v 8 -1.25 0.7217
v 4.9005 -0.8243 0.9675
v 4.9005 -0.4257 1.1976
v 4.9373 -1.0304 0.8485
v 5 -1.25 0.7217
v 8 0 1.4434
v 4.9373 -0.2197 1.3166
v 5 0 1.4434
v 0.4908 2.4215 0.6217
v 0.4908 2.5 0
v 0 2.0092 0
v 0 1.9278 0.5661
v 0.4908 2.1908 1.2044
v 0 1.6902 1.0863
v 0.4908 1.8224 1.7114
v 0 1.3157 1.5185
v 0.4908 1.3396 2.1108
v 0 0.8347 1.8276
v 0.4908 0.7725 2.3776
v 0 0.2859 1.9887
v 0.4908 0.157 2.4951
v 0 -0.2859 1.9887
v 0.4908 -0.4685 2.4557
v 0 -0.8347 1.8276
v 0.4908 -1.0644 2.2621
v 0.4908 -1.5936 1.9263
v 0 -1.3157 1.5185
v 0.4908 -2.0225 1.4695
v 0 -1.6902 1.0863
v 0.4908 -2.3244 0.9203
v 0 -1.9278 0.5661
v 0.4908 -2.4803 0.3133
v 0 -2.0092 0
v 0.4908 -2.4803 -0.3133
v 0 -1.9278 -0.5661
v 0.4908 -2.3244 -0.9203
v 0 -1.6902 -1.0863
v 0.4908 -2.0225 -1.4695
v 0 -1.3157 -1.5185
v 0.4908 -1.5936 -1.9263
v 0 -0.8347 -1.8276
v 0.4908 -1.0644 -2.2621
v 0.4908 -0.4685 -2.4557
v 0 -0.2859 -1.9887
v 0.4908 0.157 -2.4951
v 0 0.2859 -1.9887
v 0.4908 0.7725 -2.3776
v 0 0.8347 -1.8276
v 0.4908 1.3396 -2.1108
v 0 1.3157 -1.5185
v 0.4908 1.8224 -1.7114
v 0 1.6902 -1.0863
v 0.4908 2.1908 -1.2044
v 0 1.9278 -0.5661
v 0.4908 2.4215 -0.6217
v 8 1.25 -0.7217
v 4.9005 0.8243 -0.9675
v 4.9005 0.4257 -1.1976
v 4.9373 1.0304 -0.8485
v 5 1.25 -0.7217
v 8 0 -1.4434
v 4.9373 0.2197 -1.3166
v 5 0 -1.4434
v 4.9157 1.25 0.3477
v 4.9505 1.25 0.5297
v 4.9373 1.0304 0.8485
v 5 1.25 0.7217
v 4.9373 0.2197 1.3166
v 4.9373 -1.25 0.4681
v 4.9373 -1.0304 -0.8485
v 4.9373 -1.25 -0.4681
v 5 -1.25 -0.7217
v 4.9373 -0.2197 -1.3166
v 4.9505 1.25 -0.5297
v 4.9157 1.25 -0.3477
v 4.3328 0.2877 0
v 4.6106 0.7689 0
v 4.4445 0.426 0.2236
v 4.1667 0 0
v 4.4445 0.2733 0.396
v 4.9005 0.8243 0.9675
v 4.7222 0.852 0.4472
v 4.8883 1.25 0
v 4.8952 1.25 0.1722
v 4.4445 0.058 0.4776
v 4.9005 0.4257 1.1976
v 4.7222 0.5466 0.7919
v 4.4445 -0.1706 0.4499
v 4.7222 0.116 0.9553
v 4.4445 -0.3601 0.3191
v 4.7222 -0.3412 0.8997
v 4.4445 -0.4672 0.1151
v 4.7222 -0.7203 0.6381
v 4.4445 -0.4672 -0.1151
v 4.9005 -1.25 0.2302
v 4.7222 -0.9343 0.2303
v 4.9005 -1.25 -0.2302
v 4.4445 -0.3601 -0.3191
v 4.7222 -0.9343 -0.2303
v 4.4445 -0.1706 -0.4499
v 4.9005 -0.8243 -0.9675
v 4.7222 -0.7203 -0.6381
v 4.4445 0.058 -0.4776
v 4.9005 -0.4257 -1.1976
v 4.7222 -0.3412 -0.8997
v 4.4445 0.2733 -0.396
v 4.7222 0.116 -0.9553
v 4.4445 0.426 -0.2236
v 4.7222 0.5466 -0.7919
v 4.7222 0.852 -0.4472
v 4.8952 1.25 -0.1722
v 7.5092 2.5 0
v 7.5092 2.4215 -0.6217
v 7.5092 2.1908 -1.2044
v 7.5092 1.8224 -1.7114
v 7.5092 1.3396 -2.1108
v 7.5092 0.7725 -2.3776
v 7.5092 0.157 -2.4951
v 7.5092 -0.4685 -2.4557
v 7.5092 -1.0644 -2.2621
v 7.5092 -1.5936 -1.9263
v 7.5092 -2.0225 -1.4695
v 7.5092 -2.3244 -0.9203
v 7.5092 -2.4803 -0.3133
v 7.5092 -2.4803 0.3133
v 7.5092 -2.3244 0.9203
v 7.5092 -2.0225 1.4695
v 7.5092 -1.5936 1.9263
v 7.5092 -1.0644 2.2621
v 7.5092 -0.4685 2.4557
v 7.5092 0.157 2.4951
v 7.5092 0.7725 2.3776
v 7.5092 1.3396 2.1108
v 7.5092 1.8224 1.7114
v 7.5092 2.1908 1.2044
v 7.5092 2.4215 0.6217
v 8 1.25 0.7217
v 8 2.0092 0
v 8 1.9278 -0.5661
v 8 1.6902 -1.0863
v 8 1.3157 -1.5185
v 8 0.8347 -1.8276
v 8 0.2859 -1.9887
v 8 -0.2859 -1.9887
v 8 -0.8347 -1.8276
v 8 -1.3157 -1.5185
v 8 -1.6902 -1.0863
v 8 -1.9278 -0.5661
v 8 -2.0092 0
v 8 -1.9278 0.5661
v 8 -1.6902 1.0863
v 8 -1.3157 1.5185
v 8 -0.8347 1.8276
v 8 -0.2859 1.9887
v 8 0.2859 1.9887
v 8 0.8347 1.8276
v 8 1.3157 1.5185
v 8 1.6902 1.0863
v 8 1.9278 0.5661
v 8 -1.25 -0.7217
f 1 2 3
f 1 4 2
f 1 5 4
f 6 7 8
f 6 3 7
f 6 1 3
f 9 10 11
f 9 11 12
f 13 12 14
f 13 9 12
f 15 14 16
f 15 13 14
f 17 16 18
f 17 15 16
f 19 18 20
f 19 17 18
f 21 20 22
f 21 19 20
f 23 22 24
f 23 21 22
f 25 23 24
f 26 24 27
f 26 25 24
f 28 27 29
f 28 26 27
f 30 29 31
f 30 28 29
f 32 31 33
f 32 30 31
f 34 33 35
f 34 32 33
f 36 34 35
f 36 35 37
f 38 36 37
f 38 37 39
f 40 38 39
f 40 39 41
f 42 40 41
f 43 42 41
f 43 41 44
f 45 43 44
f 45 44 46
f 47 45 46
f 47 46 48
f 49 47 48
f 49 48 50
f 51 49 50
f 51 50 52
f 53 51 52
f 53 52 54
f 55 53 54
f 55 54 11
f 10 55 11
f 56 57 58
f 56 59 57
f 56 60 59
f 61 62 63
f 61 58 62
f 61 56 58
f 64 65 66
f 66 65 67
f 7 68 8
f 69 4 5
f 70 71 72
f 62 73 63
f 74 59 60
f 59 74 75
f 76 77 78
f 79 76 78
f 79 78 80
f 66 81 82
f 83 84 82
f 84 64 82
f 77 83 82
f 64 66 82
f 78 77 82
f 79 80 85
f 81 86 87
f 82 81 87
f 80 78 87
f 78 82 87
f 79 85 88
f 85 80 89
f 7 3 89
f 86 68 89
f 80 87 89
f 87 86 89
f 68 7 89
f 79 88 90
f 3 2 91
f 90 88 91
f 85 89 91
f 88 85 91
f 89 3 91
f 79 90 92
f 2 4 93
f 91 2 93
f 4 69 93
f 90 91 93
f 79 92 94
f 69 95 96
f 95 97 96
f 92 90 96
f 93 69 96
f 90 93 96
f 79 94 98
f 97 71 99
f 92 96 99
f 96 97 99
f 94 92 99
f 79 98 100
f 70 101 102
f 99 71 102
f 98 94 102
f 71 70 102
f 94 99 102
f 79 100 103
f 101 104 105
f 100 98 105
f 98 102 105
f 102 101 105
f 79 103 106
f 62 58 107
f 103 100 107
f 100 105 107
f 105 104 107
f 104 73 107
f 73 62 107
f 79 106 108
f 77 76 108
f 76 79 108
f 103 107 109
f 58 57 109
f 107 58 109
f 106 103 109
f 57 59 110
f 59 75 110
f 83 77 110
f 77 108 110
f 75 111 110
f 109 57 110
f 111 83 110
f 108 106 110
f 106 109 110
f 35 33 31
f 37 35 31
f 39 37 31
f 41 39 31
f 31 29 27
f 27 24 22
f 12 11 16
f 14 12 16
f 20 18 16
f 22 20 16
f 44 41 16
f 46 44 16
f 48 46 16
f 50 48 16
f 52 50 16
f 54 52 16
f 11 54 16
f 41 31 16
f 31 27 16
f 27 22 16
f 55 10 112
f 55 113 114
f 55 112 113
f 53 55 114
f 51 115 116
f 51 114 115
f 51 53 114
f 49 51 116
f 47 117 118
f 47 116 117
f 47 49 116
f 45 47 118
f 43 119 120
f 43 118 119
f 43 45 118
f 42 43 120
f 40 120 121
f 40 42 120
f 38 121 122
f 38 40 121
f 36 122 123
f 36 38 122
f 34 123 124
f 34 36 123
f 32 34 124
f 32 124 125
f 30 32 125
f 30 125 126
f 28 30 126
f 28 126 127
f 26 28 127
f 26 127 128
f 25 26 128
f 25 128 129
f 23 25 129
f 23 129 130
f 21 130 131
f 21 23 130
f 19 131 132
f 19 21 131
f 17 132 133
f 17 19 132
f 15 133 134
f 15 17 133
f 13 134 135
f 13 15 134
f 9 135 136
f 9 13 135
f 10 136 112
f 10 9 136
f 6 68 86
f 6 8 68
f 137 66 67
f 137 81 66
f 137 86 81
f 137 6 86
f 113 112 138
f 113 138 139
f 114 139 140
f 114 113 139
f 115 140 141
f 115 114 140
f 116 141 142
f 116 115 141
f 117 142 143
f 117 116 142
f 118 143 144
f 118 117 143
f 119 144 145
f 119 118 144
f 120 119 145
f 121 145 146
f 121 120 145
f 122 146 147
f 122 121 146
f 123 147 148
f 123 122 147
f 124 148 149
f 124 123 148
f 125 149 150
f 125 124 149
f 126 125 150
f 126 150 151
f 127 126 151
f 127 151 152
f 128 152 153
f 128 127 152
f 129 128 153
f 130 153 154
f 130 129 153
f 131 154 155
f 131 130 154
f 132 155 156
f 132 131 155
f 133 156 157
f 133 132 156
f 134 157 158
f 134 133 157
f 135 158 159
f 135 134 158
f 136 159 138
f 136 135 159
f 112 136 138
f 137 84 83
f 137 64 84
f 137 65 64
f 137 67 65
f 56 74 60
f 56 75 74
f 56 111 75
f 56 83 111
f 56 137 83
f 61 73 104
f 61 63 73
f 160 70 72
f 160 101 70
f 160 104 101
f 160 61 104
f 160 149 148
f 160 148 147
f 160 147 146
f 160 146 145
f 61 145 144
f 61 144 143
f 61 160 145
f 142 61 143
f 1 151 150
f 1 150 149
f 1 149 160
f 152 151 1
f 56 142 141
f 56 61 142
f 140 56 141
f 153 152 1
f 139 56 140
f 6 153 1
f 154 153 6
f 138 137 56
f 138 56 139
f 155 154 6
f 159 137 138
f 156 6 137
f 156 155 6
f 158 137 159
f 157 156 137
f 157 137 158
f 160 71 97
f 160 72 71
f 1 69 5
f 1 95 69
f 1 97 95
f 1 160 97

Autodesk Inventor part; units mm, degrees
ref_plane "YZ Plane" through (0, 0, 0) normal (1, 0, 0) x (0, 1, 0)
ref_plane "XZ Plane" through (0, 0, 0) normal (0, 1, 0) x (-1, 0, 0)
sketch "Skizze1" plane through (0, 0, 0) normal (0, 0, 1) x (1, 0, 0)
  line L0 (0, 0) -> (4.1667, 0)
  line L1 (8, 1.4434) -> (8, 2.5)
  line L2 (8, 2.5) -> (0, 2.5)
  line L3 (8, 1.4434) -> (5, 1.4434)
  line L4 (5, 1.4434) -> (4.1667, 0)
  line L5 (0, -0.5) -> (0, 3) projected
  line L6 (0, 2.5) -> (0, 0)
  dimension "d0" = 3
  dimension "d1" = 60
  dimension "d2" = 5
  dimension "d3" = 2.8868
  dimension "d5" = 8
revolve "Körper" add sketch "Skizze1" angle 360 about axis through (0, 0, 0) along (1, 0, 0)
chamfer "Fase1" distance 0.4908 angle 45 1 edges at (8, -2.5, 0) measured on face at (8, 2.1096, -0.3146)
sketch "Skizze2" plane through (8, 0, 0) normal (1, 0, 0) x (0, 0, -1)
  circle A0 centre (0, 0) radius 1.4434 projected
  line L0 (-0.7217, 1.25) -> (0.7217, 1.25)
  line L1 (0.7217, 1.25) -> (1.4434, 0)
  line L2 (1.4434, 0) -> (0.7217, -1.25)
  line L3 (0.7217, -1.25) -> (-0.7217, -1.25)
  line L4 (-0.7217, -1.25) -> (-1.4434, 0)
  line L5 (-1.4434, 0) -> (-0.7217, 1.25)
extrude "Loch" add sketch "Skizze2" against normal up to next contours L1 A0 | A0 L2 | L0 A0 | A0 L3 | L5 A0 | A0 L4
thread "Gewinde" size "M5x0.8" class "6g" standard "ISO Metric profile" length 8
chamfer "Fase2" distance 0.4908 angle 45 1 edges at (0, -2.5, 0) measured on face at (2.5031, 2.4676, -0.401)
ref_plane "Work Plane1" through (4, 0, 0) normal (0, 0.5, 0.866) x (1, 0, 0)
equation "\"d0\" = INTI"
equation "\"d2\" = NND"
equation "\"d3\" = 1.1547 * SW"
equation "\"d5\" = NLG"
equation "\"d7\" = -0.5 * GD1 + 0.5 * NND"
equation "\"d8\" = FAWI"
equation "\"d29\" = -0.5 * GD1 + 0.5 * NND"
equation "\"d11\" = NLG"
equation "\"d13\" = -0.5 * GD1 + 0.5 * NND"
equation "\"d14\" = FAWI"
equation "\"d30\" = -0.5 * GD1 + 0.5 * NND"
equation "\"NND\" = 5"
equation "\"NLG\" = 8"
equation "\"INTI\" = 3"
equation "\"FAWI\" = 45deg"
equation "\"SW\" = 2.5"
equation "\"GD1\" = THREADDIA - 1.2269 * PTC"
equation "\"FAWI1\" = 45deg"
equation "\"GUL\" = 0.61345 * PTC"
equation "\"SPD\" = 3.5"
equation "\"SEWI\" = 90deg"
equation "\"TOA\" = 30deg"
equation "\"THREADDIA\" = 5"
equation "\"PTC\" = 0.8"
equation "\"GAL\" = 0.61345 * PTC"
equation "\"E0\" = 1.155 * SW"
properties part number "ISO 4026 - M5 x 8" material "Edelstahl, 440C"
